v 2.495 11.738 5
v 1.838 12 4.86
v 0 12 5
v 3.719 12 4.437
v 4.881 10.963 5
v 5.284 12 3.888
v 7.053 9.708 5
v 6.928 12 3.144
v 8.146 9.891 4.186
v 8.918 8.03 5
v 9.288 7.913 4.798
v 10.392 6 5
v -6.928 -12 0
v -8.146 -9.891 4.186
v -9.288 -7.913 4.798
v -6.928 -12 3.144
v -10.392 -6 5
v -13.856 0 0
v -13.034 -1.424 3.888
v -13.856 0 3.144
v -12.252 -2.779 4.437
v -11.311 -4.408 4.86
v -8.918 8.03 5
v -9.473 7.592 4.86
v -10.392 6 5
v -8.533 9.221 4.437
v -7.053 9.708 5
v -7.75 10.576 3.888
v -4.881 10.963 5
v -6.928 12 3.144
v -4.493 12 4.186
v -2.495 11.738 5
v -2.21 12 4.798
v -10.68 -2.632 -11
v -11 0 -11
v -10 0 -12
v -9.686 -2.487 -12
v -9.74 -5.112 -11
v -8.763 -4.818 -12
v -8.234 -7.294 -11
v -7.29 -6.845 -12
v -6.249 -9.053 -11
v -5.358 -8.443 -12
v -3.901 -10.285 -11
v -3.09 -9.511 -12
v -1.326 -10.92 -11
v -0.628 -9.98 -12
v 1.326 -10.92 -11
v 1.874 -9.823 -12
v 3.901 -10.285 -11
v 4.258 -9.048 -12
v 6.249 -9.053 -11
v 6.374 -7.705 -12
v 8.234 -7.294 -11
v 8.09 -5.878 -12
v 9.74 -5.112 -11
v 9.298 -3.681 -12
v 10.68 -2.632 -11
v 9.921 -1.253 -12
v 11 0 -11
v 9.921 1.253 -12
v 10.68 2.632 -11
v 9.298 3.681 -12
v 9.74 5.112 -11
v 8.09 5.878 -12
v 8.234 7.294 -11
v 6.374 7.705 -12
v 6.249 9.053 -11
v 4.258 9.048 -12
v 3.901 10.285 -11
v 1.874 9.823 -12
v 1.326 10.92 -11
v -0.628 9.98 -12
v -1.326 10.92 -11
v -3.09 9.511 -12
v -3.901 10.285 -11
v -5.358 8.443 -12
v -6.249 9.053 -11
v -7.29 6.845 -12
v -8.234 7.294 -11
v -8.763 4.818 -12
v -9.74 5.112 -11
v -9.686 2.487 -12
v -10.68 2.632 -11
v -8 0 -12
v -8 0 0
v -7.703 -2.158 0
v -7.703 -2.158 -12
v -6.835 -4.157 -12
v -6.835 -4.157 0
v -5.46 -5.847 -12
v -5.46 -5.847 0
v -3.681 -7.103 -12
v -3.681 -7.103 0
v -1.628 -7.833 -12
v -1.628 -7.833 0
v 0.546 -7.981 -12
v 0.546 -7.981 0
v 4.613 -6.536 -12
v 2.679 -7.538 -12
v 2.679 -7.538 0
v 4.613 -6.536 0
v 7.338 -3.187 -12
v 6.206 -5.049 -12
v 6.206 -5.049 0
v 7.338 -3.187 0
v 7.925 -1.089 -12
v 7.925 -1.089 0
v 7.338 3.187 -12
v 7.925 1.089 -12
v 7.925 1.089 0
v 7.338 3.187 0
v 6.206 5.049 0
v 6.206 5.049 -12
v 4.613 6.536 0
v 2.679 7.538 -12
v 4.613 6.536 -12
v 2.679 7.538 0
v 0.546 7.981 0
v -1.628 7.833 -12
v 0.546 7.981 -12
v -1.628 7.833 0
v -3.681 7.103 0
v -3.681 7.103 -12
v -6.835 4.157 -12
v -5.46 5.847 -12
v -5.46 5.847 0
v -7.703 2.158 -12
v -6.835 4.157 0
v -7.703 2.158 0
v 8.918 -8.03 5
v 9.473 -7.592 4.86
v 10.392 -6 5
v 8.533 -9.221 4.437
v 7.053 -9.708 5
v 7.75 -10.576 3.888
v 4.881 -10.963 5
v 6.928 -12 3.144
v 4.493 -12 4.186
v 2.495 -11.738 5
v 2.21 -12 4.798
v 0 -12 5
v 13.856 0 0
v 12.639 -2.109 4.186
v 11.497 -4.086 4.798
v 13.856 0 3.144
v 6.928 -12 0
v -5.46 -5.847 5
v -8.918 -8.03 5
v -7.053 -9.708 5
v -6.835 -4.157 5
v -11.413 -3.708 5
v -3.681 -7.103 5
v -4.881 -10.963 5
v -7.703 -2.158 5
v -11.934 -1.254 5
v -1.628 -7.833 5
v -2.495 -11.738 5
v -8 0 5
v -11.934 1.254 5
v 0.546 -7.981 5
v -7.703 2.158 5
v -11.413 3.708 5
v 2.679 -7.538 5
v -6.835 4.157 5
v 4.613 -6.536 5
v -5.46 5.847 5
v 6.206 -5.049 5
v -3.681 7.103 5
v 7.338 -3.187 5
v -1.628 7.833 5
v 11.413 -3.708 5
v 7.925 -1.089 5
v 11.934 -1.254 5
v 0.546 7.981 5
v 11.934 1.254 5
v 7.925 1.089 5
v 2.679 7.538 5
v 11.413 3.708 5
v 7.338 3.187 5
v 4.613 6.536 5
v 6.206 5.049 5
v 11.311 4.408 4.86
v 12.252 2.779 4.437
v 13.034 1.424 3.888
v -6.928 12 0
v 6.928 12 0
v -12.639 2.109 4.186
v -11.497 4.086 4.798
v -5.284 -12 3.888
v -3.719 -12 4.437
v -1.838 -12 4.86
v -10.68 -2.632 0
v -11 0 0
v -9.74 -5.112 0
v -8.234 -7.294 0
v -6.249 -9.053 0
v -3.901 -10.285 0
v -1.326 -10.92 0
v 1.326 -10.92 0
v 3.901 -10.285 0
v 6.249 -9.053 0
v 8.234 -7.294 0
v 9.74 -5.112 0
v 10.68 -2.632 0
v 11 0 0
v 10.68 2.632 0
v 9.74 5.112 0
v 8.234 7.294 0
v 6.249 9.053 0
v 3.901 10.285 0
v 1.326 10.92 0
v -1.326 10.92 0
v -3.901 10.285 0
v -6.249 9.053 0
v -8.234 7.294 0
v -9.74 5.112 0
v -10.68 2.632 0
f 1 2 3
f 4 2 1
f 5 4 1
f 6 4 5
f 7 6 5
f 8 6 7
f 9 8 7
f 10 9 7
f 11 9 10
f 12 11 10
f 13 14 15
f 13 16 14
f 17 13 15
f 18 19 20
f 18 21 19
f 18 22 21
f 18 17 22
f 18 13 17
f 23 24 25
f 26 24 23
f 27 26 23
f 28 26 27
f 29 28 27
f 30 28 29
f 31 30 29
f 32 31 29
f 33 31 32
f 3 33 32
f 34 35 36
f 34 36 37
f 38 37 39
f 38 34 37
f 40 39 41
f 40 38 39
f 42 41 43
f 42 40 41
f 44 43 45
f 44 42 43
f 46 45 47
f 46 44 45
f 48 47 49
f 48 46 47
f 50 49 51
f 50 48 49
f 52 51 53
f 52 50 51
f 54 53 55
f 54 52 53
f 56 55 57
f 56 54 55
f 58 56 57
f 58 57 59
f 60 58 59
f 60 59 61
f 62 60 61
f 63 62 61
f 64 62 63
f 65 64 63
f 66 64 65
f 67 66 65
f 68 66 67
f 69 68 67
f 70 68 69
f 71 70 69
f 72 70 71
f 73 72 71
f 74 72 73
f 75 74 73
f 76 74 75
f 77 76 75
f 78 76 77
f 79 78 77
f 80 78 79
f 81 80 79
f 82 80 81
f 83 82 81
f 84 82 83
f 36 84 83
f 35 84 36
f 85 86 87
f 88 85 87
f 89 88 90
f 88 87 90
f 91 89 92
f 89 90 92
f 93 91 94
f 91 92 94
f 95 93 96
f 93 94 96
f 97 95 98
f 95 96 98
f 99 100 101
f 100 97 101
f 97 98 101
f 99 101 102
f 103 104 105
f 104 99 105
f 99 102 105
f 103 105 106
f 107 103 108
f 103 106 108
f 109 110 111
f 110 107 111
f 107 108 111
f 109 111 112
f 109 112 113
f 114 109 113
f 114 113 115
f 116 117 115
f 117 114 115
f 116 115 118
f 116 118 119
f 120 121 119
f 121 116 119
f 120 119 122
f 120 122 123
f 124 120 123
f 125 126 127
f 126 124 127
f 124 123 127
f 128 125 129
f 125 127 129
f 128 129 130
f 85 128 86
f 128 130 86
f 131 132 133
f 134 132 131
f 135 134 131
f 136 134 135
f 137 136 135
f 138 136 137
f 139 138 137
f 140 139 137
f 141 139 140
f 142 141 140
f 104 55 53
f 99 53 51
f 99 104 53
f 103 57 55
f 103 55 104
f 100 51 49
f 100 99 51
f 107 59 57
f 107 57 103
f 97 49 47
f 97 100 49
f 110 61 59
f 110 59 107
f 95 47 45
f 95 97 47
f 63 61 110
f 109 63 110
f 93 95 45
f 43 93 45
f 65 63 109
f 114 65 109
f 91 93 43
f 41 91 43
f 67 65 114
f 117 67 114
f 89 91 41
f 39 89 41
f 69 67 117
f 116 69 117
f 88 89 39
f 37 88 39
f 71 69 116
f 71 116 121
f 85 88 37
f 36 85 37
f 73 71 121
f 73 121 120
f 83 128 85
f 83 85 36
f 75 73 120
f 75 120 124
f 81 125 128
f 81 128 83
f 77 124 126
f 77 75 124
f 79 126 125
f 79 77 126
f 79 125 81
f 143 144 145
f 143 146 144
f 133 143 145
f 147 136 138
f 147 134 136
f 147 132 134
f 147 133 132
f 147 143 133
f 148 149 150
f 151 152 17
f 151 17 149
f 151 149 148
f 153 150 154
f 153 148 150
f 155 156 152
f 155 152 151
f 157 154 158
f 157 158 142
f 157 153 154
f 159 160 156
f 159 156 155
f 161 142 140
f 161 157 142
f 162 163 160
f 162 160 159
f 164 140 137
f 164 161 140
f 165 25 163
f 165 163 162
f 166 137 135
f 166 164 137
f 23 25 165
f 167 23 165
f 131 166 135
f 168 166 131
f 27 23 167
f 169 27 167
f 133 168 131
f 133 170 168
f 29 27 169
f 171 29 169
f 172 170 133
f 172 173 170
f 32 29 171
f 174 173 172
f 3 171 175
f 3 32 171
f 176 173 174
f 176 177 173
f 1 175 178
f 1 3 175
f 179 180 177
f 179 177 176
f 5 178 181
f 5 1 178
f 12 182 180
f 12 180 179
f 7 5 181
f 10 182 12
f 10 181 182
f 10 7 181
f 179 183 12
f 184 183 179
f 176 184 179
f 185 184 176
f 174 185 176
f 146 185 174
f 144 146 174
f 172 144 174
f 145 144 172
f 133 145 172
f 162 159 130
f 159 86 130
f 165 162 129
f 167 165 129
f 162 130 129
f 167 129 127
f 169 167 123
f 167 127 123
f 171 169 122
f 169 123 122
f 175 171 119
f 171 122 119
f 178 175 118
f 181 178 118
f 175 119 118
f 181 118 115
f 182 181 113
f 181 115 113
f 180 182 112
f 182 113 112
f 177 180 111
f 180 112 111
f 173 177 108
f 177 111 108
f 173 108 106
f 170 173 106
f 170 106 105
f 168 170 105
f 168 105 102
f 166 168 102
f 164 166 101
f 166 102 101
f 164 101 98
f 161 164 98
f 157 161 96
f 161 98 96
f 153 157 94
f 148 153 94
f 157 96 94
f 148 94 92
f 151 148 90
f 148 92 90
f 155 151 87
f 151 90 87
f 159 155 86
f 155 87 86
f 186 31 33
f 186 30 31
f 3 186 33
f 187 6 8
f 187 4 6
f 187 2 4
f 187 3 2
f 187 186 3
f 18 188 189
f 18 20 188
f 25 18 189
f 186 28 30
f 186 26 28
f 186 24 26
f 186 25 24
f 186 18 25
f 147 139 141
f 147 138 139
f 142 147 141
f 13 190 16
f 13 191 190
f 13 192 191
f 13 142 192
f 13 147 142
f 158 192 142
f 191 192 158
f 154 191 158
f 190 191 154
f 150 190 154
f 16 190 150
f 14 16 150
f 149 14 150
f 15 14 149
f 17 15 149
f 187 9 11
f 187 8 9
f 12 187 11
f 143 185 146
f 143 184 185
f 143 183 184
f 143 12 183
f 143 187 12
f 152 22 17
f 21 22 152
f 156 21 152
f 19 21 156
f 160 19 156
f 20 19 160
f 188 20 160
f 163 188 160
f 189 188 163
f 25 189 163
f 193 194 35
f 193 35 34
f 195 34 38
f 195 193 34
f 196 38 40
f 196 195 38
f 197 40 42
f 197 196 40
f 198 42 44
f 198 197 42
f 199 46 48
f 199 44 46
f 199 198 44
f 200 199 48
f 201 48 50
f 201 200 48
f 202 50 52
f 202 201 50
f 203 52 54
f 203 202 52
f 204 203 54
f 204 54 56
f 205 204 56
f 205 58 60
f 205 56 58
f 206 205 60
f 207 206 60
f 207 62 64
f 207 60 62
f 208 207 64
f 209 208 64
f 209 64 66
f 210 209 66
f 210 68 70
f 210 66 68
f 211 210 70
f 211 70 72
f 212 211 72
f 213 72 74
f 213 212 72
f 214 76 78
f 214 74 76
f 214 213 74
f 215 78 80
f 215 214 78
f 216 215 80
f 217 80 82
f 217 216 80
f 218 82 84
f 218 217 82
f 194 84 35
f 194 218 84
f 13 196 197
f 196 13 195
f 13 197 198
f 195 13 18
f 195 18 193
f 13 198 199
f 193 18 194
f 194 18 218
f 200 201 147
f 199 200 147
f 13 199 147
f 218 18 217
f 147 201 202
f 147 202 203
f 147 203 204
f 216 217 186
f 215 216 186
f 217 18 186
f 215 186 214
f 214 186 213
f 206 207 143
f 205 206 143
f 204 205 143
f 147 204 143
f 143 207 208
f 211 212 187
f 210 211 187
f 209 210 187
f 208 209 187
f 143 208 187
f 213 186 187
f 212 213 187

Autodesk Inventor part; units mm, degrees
ref_plane "YZ Plane" through (0, 0, 0) normal (1, 0, 0) x (0, 1, 0)
ref_plane "XZ Plane" through (0, 0, 0) normal (0, 1, 0) x (-1, 0, 0)
ref_plane "XY Plane" through (0, 0, 0) normal (0, 0, 1) x (1, 0, 0)
sketch "Sketch1" plane through (0, 0, 0) normal (0, 0, 1) x (1, 0, 0)
  line L0 (-6.9282, -12) -> (-13.8564, 0)
  line L1 (-13.8564, 0) -> (-6.9282, 12)
  line L2 (-6.9282, 12) -> (6.9282, 12)
  line L3 (6.9282, 12) -> (13.8564, 0)
  line L4 (13.8564, 0) -> (6.9282, -12)
  line L5 (6.9282, -12) -> (-6.9282, -12)
  circle A0 centre (0, 0) radius 12
  circle A1 centre (0, 0) radius 7
  dimension "d0" = 24
  dimension "d1" = 24
  dimension "d2" = 14
extrude "Extrusion1" add sketch "Sketch1" along normal blind 5 contours L0 A0 L5 | L0 L1 A0 | A0 | A0 L4 L5 | L1 L2 A0 | A0 L3 L4 | L2 L3 A0 | A1
sketch "Sketch2" plane through (0, 0, 5) normal (0, 0, 1) x (1, 0, 0)
  circle A0 centre (0, 0) radius 12
  dimension "d5" = 24
extrude "Extrusion2" cut sketch "Sketch2" against normal blind 5 draft 45 keep common part
sketch "Sketch3" plane through (0, 0, 0) normal (0, 0, -1) x (-1, 0, 0)
  circle A0 centre (0, 0) radius 11
  circle A1 centre (0, 0) radius 8
  dimension "d8" = 22
  dimension "d9" = 16
extrude "Extrusion3" add sketch "Sketch3" along normal blind 12
extrude "Extrusion4" cut sketch "Sketch3" against normal through all contours A1
thread "Thread1" size "M22x1.5" class "6g" standard "ISO Metric profile" full length
chamfer "Chamfer1" distance 1 angle 45 1 edges at (11, 0, -12)
equation "\"BendRadius\" = Thickness"
equation "\"BendReliefWidth\" = Thickness"
equation "\"BendReliefDepth\" = 0.5 * Thickness"
equation "\"CornerReliefSize\" = 4 * Thickness"
equation "\"MinimumRemnant\" = 2 * Thickness"
equation "\"TransitionRadius\" = BendRadius"
equation "\"JacobiRadiusSize\" = BendRadius"
equation "\"GapSize\" = Thickness"
equation "\"Thickness\" = 0.5"
properties part number "Hex.nut"
